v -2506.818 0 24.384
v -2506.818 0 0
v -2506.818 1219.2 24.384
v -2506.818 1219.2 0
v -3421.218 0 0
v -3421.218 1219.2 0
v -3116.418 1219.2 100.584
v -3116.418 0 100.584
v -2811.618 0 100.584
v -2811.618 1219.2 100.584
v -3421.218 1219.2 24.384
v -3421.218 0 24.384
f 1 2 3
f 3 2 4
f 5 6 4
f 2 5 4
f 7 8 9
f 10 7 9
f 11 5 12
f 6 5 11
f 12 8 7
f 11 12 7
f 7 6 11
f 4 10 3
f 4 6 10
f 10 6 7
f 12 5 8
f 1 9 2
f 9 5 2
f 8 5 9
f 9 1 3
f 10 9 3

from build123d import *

# Parameters (mm, degrees)
F0_W     = 914.4
F0_H     = 1219.2
F1_DEPTH = 100.584
F2_SIZE2 = 304.8
F2_SIZE  = 76.2
F3_SIZE2 = 76.2
F3_SIZE  = 304.8


with BuildPart() as f1:
    # F0 (on Top) → F1 (new body)
    with BuildSketch(Plane.XY):
        with Locations((-2964.017556, 609.6)):
            Rectangle(F0_W, F0_H)
    extrude(amount=F1_DEPTH)

    # F2
    f2_edges = [f1.edges().sort_by_distance(p)[0] for p in [
        (-3421.217556, 609.6, 100.584),
    ]]
    chamfer(f2_edges, length=F2_SIZE, length2=F2_SIZE2)

    # F3
    f3_edges = [f1.edges().sort_by_distance(p)[0] for p in [
        (-2506.817556, 609.6, 100.584),
    ]]
    chamfer(f3_edges, length=F3_SIZE, length2=F3_SIZE2)


solid = f1.part
